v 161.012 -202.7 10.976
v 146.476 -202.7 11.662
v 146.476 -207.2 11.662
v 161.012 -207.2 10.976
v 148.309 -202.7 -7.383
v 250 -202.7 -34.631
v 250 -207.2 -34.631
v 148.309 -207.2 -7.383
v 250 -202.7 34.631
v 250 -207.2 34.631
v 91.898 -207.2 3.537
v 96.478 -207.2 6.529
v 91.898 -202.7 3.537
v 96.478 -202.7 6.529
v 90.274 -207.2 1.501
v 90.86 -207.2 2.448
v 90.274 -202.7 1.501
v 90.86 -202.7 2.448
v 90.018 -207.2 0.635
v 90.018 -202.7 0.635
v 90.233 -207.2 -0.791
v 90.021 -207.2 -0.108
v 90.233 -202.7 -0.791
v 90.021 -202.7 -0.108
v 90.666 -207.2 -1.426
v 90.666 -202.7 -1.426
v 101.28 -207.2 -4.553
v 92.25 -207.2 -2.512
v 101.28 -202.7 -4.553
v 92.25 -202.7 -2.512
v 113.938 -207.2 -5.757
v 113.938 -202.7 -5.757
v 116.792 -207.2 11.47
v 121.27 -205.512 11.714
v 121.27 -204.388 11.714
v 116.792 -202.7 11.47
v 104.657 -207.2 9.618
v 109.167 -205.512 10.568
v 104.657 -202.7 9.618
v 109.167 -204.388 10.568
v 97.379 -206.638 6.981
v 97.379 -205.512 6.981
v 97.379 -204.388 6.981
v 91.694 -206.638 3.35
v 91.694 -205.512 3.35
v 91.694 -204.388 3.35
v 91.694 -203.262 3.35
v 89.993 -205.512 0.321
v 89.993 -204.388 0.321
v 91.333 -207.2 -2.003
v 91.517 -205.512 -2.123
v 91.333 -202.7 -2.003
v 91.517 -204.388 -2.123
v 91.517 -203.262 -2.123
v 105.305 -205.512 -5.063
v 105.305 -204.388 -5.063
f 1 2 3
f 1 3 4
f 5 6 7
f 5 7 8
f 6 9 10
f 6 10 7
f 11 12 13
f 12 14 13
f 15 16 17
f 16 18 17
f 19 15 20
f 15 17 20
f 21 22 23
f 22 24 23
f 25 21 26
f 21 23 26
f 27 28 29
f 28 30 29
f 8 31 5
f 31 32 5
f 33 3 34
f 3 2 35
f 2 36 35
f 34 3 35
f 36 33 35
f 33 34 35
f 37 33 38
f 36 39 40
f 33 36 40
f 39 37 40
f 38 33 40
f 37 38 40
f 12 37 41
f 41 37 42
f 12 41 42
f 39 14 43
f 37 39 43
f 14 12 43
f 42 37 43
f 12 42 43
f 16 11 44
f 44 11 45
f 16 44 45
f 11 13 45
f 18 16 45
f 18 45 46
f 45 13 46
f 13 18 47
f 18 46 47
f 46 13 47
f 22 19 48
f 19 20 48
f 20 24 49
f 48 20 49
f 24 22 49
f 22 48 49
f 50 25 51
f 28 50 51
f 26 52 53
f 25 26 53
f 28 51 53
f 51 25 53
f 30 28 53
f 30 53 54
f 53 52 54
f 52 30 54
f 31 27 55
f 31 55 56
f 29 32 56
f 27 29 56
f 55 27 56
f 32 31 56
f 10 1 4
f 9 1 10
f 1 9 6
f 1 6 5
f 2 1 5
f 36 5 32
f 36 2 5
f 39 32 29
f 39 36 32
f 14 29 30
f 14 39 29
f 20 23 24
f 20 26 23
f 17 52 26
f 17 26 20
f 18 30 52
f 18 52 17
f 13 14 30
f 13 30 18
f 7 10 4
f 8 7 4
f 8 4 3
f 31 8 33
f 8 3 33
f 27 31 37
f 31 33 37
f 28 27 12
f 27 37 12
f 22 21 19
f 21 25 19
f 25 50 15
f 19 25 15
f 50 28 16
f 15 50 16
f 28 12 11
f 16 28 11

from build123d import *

# Parameters (mm, degrees)
PAD_DEPTH = 4.5


with BuildPart() as part:
    # Sketch → Pad (new body)
    with BuildSketch(Plane.XZ):
        with BuildLine():
            Line((0, 34.630756), (0, -34.630756))
            Line((0, -34.630756), (-101.690887, -7.382765))
            add(Edge.make_bspline(
                [(-103.524005, 11.662305), (-126.796, 12.2593), (-143.268677, 10.877765), (-153.364594, 6.945673), (-158.997, 3.22612), (-160.484863, 0.250483), (-159.103333, -2.300063), (-154.002, -3.78788), (-145.607, -5.06316), (-136.361, -5.91334), (-101.690887, -7.382765)],
                knots=[0, 0, 0, 0, 0.125, 0.25, 0.375, 0.5, 0.625, 0.75, 0.875, 1, 1, 1, 1], degree=3))
            add(Edge.make_bspline(
                [(-103.524005, 11.662305), (-88.98761, 10.976098)],
                knots=[0, 0, 1, 1], degree=1))
            Line((-88.98761, 10.976098), (0, 34.630756))
        make_face()
    extrude(amount=PAD_DEPTH)


with BuildPart() as part_1:
    # Body placement: moved
    add(part.part.moved(Location((250, 250, 0))))


with BuildPart() as part_2:
    # Body001 placement: moved
    add(part_1.part.moved(Location((0, -452.7, 0))))


solid = part_2.part
